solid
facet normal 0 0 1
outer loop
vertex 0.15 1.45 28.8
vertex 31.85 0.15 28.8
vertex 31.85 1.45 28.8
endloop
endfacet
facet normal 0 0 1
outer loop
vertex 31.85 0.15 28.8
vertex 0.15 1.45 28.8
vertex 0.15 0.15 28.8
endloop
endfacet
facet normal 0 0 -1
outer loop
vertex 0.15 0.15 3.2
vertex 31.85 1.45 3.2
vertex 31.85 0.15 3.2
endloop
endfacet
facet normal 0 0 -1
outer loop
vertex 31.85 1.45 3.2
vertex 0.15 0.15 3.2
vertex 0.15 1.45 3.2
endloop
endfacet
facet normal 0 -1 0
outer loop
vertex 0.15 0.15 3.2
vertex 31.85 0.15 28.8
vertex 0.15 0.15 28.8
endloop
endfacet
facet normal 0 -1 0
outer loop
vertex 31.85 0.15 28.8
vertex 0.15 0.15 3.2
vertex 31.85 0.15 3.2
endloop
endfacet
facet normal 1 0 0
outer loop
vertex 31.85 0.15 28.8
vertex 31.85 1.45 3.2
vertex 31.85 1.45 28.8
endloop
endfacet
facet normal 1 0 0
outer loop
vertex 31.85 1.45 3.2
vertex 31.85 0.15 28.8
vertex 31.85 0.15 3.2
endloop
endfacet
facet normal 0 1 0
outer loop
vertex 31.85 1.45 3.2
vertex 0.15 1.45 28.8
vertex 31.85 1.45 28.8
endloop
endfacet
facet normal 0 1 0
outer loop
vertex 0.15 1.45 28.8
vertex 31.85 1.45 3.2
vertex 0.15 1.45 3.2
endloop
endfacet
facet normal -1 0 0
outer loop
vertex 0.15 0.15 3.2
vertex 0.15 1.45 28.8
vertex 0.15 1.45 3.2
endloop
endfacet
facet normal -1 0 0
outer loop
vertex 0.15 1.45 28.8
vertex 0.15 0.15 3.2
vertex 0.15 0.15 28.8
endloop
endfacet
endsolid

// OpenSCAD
/* LEGO Text Bricks
   by Lyl3

Create LEGO compatible bricks with text engraved on the sides

This code is published at:
https://www.thingiverse.com/thing:3867358
licensed under the Creative Commons - Attribution - Share Alike license (CC BY-SA 3.0)

V0.1 - working code
V0.2 - corrected brick dimensions to have 0.1 mm play on each side
       corrected stud height to be 1.8 mm instead of 1.6 mm
       corrected roof thickness to be 1.0 mm instead of 1.6 mm
V0.3 - cleaned the code
V0.4 - adjusted wall thickness from 1.6 mm to 1.4 mm
       fixed math for stud positions
       fixed math for play so that it's split between sides instead of on just one side
V0.5 - added tolerance parameter
V0.6 - corrected position of text to account for play and tolerance
V0.7 - set sane ranges for all parameters
V1.0 - adjusted diameter of under-stud from 6.51 to 6.41
       adjusted width of walls from 1.4 mm to 1.5 mm
       ready for release
V1.1 - changed boolean parameters to yes/no parameters to make them Thingiverse Customizer-friendly
V1.2 - allowed $fn to be adjusted from previous hard-coded value of 100
V1.3 - allow text Z shift to be negative 
V1.4 - added parameter for spacing between letters
V1.5 - moved studs down 0.00001 mm so that the brick and studs are a single mesh
V1.6 - bug fix: parameter for spacing between letters now applied to text on back,left and right sides
     - allowed LEGO dimensions to be overridden
V1.7 - modified font selection method to work around bug that Thingiverse customizer recently introduced
         that prevents direct selection of fonts with a style specified
       added capability to select any font
V1.8 - added capability to have raised text instead of embossed text

*/

/*
   Set default brick to be #2456 6x2 
*/
/* [Brick Parameters] */

// Brick length (specified in number of studs).
brickLength = 2; // [1:1:48]

// Brick width (specified in number of studs).
brickWidth = 1;  // [1:1:48]

// Brick height (specified in LEGO height units: 3 is normal brick height, 1 is plate height).
brickHeight = 1; // [1:1:18]

// Studs on top of the brick?
withStuds = "yes"; // [yes,no]
createStuds = (withStuds=="yes") ? true : false;

// Under-studs on underneath of skinny bricks? Skinny bricks that are only one unit wide have smaller solid cylinders (under-studs) underneath instead of the usual hollow cylinders. These have a tiny footprint and may not stick to the build-plate, so you may want to avoid printing them.
withUnderStuds = "yes"; // [yes,no]
createUnderStuds = (withUnderStuds=="yes") ? true : false;


/* [Text Parameters] */

// Raised text instead of embossed text?
raisedText = "no"; // [yes,no]
textRaised = (raisedText=="yes") ? true : false;

frontText = "";
frontTextScale = 1.0; // [0:0.01:1]

backText = "";
backTextScale = 1.0; // [0:0.01:1]

leftText = ""; 
leftTextScale = 1.0; // [0:0.01:1]

rightText = ""; 
rightTextScale = 1.0; // [0:0.01:1]

/* [Advanced parameters] */

// Tolerance to account for 3D printing inaccuracies (mm). This decreases the sizes of all vertical surfaces (brick walls, studs, under-tubes, and under-studs) to provide a better fit. It is equivalent to a negative horizontal expansion setting in the Cura slicer. You might want to decrease this for bricks that are only 1 unit wide without under-studs as they will be naturally looser fitting than other bricks. The best setting is printer/filament dependent so I've set the default for my printer on the assumption that it's average. 
tolerance = 0.05; // [0:0.01:0.1]

// Some suitable fonts
//fontName = "Arial Black:style=Regular";    // Not available on Thingiverse customizer
//fontName = "Biryani:style=Black";          // Has short numbers
//fontName = "Heebo:style=Black";            // Has tight kerning
//fontName = "Maven Pro:style=Black";        // Has tight spacing on "g"
//fontName = "Nunito Sans:style=Black";      // Has tight kerning
//fontName = "Orbitron:style=Black";         // Has blocky letters
//fontName = "Palanquin Dark:style=Bold";    // Has descended numbers
//fontName = "Raleway:style=Black";          // Has descended numbers
//fontName = "Roboto:style=Black";           // No issues
//fontName = "Yantramanav:style=Black";      // No issues


// Choose from a small selection of similar fonts that should work well in this application (NOTE: Arial is not available on Thingiverse).
fontName = 9; // [2:Biryani Black, 3:Heebo Black, 4:Maven Pro Black, 5:Nunito Sans Black, 6:Orbitron Black, 7:Palanquin Dark Bold, 8:Raleway Black, 9:Roboto Black, 10:Yantramanav Black, 0:other, 1:Arial Black]

// If "other" is selected above, you can specify any font available from the Google fonts repository . See https://fonts.google.com/ for available fonts. For example, specify "Overpass Mono:style=Bold" to allow entering some special symbols like heart, club, etc.
otherFont = "Overpass Mono";

// The base size of the text on all sides (can be scaled down in the text parameters section).
textSize = 5.5; // [1:0.1:10]

// Spacing between letters. (ratio: 1 is normal spacing of the font) It's better to have this a little higher for this application.
letterSpacing = 1.05;  // [0.9:0.01:2.0]

// How much to shift the text in the Z dimension (mm).
textZShift = 2.0;         // [-5:0.1:8]

// The depth of the text (mm). You should probably decrease this from the default of 0.8 if you plan on scaling the model up in your slicer.
textDepth = 0.8;  // [0.2:0.01:1.0]

// Resolution of circles. 50 fragments is more than enough for such a small cylinders unless the model will be later scaled up
numberFragments = 50;                 // [6:1:100] 
$fn = numberFragments;

/* [Advanced parameters: Override LEGO dimensions] */

// X and Y dimension of one brick unit (mm)
UNIT_LENGTH = 8; // [0.8:0.01:80]

// plate height (a standard brick is 3 times this height) (mm)
PLATE_HEIGHT = 3.2; // [0.32:0.01:32]

// thickness of brick roof (mm)
ROOF_THICKNESS = 1; // [0.1:0.01:10]

// thickness of brick outer wall as in the original 1.5 mm wall without nubs (mm)
WALL_THICKNESS = 1.5; // [0.15:0.01:15]

// diameter of the studs (solid cylinders) on top of a brick (mm)
STUD_DIAMETER = 4.8*1.05; // [0.48:0.01:48]

// height of the studs (solid cylinders) on top of a brick (mm)
STUD_HEIGHT = 1.8; // [0.18:0.01:18]

// outer diameter of the under-tubes (hollow cylinders) on the underside of bricks with length > 1 and width > 1 (mm)
UNDERTUBE_OUTER_DIAMETER = 6.41; // [0.64:0.01:64.1]

// inner diameter of the under-tubes (hollow cylinders) on the underside of bricks with length > 1 and width > 1 (mm)
UNDERTUBE_INNER_DIAMETER = 4.8; // [0.48:0.01:48]

// diameter of the under-studs (solid cylinders) on the underside of bricks with length = 1 or width = 1 (mm)
UNDERSTUD_DIAMETER = 1.6; // [0.16:0.01:16]

// the necessary play between bricks so that they fit together
PLAY = 0.2; // [0.02:0.01:2]

/* [Hidden] */
fudge = 0.01;               // Amount to expand some dimensions to ensure manifold model

// This convoluted way of selecting the font from an array was a requirement introduced by a change
// on the Thingiverse customizer that broke the ability to directly select fonts with a style specified.
// This issue was first noticed 2010-02-26 and probably happened within the two months prior to that date.
fontNames = ["other", "Arial Black:style=Regular", "Biryani:style=Black", "Heebo:style=Black", "Maven Pro:style=Black", "Nunito Sans:style=Black", "Orbitron:style=Black", "Palanquin Dark:style=Bold", "Raleway:style=Black", "Roboto:style=Black", "Yantramanav:style=Black"];

selectedFont = (fontName==0) ? otherFont : fontNames[fontName];

textBack = textRaised ? 0 : textDepth;



%translate([0,0,PLATE_HEIGHT*(3*3-1)])brick(4,1,1, true, false);
%brick(4,1,1, false, true);
translate([PLAY/2+tolerance, PLAY/2+tolerance ,PLATE_HEIGHT])
    cube([8*4-PLAY-2*tolerance,1.5-PLAY,PLATE_HEIGHT*(3*3-1)]);

/*
   Module to make a simple rectangular LEGO compatible brick
   Makes a #3001 4x2 brick by default
*/
module brick(length=4, width=2, height=3, createStuds=true, createUnderStuds=true) {

  // The brick
  translate([PLAY/2+tolerance, PLAY/2+tolerance, 0])
    difference() {
      cube([length*UNIT_LENGTH-PLAY-2*tolerance, width*UNIT_LENGTH-PLAY-2*tolerance, height*PLATE_HEIGHT]);
      translate([WALL_THICKNESS-2*tolerance, WALL_THICKNESS-2*tolerance, -ROOF_THICKNESS])
        cube([length*UNIT_LENGTH-2*WALL_THICKNESS-PLAY+2*tolerance, width*UNIT_LENGTH-2*WALL_THICKNESS-PLAY+2*tolerance, height*PLATE_HEIGHT]);
    }

  // The studs
  if(createStuds) {
    translate([0,0, height*PLATE_HEIGHT-0.00001])
      for (y = [0:width-1]) {
        for (x = [0:length-1]) {
          translate([(x+0.5)*UNIT_LENGTH, (y+0.5)*UNIT_LENGTH, 0])
            cylinder(h=STUD_HEIGHT, d=STUD_DIAMETER-2*tolerance);
        }
      }
  }

  // The under-tubes (hollow cylinders)
  if (width > 1 && length > 1) {
    for (y = [1:width-1]) {
      for (x = [1:length-1]) {
        difference() {
		  translate([x*UNIT_LENGTH, y*UNIT_LENGTH, 0])
			cylinder(h=height*PLATE_HEIGHT-ROOF_THICKNESS+fudge, d = UNDERTUBE_OUTER_DIAMETER-2*tolerance);
		  translate([x*UNIT_LENGTH, y*UNIT_LENGTH, -fudge])
			cylinder(h=height*PLATE_HEIGHT-ROOF_THICKNESS+fudge, d = UNDERTUBE_INNER_DIAMETER+2*tolerance);				
		}
	  }
	}
  }

  // The under-studs (smaller solid cylinders) along the length
  if (width == 1 && length > 1 && createUnderStuds) {	
	for (x = [1:length-1]) {
	  translate([x*UNIT_LENGTH, 0.5*UNIT_LENGTH, 0])
	    cylinder(h=height*PLATE_HEIGHT-WALL_THICKNESS, d=UNDERSTUD_DIAMETER-2*tolerance);
	}
  }

  // The under-studs (smaller solid cylinders) along the width
  if (length == 1 && width > 1 && createUnderStuds) {	
	for (y = [1:width-1]) {
	  translate([0.5*UNIT_LENGTH, y*UNIT_LENGTH, 0])
		cylinder(h=height*PLATE_HEIGHT-WALL_THICKNESS, d=UNDERSTUD_DIAMETER-2*tolerance);
	}
  }

}

module makeText () {
  translate([0, -brickWidth/2*UNIT_LENGTH+textBack+PLAY/2+tolerance, textZShift]) rotate([90, 0, 0])
    linear_extrude(textDepth+fudge) text(frontText, font=selectedFont, size=textSize*frontTextScale, halign="center", spacing=letterSpacing);
  translate([0, brickWidth/2*UNIT_LENGTH-textBack-PLAY/2-tolerance, textZShift]) rotate([90, 0, 180])
    linear_extrude(textDepth+fudge) text(backText, font=selectedFont, size=textSize*backTextScale, halign="center", spacing=letterSpacing);
  translate([-brickLength/2*UNIT_LENGTH+textBack+PLAY/2+tolerance, 0, textZShift]) rotate([90, 0, 270])
    linear_extrude(textDepth+fudge) text(leftText, font=selectedFont, size=textSize*leftTextScale, halign="center", spacing=letterSpacing);
  translate([brickLength/2*UNIT_LENGTH-textBack-PLAY/2-tolerance, 0, textZShift]) rotate([90, 0, 90])
    linear_extrude(textDepth+fudge) text(rightText, font=selectedFont, size=textSize*rightTextScale, halign="center", spacing=letterSpacing);
}
	
